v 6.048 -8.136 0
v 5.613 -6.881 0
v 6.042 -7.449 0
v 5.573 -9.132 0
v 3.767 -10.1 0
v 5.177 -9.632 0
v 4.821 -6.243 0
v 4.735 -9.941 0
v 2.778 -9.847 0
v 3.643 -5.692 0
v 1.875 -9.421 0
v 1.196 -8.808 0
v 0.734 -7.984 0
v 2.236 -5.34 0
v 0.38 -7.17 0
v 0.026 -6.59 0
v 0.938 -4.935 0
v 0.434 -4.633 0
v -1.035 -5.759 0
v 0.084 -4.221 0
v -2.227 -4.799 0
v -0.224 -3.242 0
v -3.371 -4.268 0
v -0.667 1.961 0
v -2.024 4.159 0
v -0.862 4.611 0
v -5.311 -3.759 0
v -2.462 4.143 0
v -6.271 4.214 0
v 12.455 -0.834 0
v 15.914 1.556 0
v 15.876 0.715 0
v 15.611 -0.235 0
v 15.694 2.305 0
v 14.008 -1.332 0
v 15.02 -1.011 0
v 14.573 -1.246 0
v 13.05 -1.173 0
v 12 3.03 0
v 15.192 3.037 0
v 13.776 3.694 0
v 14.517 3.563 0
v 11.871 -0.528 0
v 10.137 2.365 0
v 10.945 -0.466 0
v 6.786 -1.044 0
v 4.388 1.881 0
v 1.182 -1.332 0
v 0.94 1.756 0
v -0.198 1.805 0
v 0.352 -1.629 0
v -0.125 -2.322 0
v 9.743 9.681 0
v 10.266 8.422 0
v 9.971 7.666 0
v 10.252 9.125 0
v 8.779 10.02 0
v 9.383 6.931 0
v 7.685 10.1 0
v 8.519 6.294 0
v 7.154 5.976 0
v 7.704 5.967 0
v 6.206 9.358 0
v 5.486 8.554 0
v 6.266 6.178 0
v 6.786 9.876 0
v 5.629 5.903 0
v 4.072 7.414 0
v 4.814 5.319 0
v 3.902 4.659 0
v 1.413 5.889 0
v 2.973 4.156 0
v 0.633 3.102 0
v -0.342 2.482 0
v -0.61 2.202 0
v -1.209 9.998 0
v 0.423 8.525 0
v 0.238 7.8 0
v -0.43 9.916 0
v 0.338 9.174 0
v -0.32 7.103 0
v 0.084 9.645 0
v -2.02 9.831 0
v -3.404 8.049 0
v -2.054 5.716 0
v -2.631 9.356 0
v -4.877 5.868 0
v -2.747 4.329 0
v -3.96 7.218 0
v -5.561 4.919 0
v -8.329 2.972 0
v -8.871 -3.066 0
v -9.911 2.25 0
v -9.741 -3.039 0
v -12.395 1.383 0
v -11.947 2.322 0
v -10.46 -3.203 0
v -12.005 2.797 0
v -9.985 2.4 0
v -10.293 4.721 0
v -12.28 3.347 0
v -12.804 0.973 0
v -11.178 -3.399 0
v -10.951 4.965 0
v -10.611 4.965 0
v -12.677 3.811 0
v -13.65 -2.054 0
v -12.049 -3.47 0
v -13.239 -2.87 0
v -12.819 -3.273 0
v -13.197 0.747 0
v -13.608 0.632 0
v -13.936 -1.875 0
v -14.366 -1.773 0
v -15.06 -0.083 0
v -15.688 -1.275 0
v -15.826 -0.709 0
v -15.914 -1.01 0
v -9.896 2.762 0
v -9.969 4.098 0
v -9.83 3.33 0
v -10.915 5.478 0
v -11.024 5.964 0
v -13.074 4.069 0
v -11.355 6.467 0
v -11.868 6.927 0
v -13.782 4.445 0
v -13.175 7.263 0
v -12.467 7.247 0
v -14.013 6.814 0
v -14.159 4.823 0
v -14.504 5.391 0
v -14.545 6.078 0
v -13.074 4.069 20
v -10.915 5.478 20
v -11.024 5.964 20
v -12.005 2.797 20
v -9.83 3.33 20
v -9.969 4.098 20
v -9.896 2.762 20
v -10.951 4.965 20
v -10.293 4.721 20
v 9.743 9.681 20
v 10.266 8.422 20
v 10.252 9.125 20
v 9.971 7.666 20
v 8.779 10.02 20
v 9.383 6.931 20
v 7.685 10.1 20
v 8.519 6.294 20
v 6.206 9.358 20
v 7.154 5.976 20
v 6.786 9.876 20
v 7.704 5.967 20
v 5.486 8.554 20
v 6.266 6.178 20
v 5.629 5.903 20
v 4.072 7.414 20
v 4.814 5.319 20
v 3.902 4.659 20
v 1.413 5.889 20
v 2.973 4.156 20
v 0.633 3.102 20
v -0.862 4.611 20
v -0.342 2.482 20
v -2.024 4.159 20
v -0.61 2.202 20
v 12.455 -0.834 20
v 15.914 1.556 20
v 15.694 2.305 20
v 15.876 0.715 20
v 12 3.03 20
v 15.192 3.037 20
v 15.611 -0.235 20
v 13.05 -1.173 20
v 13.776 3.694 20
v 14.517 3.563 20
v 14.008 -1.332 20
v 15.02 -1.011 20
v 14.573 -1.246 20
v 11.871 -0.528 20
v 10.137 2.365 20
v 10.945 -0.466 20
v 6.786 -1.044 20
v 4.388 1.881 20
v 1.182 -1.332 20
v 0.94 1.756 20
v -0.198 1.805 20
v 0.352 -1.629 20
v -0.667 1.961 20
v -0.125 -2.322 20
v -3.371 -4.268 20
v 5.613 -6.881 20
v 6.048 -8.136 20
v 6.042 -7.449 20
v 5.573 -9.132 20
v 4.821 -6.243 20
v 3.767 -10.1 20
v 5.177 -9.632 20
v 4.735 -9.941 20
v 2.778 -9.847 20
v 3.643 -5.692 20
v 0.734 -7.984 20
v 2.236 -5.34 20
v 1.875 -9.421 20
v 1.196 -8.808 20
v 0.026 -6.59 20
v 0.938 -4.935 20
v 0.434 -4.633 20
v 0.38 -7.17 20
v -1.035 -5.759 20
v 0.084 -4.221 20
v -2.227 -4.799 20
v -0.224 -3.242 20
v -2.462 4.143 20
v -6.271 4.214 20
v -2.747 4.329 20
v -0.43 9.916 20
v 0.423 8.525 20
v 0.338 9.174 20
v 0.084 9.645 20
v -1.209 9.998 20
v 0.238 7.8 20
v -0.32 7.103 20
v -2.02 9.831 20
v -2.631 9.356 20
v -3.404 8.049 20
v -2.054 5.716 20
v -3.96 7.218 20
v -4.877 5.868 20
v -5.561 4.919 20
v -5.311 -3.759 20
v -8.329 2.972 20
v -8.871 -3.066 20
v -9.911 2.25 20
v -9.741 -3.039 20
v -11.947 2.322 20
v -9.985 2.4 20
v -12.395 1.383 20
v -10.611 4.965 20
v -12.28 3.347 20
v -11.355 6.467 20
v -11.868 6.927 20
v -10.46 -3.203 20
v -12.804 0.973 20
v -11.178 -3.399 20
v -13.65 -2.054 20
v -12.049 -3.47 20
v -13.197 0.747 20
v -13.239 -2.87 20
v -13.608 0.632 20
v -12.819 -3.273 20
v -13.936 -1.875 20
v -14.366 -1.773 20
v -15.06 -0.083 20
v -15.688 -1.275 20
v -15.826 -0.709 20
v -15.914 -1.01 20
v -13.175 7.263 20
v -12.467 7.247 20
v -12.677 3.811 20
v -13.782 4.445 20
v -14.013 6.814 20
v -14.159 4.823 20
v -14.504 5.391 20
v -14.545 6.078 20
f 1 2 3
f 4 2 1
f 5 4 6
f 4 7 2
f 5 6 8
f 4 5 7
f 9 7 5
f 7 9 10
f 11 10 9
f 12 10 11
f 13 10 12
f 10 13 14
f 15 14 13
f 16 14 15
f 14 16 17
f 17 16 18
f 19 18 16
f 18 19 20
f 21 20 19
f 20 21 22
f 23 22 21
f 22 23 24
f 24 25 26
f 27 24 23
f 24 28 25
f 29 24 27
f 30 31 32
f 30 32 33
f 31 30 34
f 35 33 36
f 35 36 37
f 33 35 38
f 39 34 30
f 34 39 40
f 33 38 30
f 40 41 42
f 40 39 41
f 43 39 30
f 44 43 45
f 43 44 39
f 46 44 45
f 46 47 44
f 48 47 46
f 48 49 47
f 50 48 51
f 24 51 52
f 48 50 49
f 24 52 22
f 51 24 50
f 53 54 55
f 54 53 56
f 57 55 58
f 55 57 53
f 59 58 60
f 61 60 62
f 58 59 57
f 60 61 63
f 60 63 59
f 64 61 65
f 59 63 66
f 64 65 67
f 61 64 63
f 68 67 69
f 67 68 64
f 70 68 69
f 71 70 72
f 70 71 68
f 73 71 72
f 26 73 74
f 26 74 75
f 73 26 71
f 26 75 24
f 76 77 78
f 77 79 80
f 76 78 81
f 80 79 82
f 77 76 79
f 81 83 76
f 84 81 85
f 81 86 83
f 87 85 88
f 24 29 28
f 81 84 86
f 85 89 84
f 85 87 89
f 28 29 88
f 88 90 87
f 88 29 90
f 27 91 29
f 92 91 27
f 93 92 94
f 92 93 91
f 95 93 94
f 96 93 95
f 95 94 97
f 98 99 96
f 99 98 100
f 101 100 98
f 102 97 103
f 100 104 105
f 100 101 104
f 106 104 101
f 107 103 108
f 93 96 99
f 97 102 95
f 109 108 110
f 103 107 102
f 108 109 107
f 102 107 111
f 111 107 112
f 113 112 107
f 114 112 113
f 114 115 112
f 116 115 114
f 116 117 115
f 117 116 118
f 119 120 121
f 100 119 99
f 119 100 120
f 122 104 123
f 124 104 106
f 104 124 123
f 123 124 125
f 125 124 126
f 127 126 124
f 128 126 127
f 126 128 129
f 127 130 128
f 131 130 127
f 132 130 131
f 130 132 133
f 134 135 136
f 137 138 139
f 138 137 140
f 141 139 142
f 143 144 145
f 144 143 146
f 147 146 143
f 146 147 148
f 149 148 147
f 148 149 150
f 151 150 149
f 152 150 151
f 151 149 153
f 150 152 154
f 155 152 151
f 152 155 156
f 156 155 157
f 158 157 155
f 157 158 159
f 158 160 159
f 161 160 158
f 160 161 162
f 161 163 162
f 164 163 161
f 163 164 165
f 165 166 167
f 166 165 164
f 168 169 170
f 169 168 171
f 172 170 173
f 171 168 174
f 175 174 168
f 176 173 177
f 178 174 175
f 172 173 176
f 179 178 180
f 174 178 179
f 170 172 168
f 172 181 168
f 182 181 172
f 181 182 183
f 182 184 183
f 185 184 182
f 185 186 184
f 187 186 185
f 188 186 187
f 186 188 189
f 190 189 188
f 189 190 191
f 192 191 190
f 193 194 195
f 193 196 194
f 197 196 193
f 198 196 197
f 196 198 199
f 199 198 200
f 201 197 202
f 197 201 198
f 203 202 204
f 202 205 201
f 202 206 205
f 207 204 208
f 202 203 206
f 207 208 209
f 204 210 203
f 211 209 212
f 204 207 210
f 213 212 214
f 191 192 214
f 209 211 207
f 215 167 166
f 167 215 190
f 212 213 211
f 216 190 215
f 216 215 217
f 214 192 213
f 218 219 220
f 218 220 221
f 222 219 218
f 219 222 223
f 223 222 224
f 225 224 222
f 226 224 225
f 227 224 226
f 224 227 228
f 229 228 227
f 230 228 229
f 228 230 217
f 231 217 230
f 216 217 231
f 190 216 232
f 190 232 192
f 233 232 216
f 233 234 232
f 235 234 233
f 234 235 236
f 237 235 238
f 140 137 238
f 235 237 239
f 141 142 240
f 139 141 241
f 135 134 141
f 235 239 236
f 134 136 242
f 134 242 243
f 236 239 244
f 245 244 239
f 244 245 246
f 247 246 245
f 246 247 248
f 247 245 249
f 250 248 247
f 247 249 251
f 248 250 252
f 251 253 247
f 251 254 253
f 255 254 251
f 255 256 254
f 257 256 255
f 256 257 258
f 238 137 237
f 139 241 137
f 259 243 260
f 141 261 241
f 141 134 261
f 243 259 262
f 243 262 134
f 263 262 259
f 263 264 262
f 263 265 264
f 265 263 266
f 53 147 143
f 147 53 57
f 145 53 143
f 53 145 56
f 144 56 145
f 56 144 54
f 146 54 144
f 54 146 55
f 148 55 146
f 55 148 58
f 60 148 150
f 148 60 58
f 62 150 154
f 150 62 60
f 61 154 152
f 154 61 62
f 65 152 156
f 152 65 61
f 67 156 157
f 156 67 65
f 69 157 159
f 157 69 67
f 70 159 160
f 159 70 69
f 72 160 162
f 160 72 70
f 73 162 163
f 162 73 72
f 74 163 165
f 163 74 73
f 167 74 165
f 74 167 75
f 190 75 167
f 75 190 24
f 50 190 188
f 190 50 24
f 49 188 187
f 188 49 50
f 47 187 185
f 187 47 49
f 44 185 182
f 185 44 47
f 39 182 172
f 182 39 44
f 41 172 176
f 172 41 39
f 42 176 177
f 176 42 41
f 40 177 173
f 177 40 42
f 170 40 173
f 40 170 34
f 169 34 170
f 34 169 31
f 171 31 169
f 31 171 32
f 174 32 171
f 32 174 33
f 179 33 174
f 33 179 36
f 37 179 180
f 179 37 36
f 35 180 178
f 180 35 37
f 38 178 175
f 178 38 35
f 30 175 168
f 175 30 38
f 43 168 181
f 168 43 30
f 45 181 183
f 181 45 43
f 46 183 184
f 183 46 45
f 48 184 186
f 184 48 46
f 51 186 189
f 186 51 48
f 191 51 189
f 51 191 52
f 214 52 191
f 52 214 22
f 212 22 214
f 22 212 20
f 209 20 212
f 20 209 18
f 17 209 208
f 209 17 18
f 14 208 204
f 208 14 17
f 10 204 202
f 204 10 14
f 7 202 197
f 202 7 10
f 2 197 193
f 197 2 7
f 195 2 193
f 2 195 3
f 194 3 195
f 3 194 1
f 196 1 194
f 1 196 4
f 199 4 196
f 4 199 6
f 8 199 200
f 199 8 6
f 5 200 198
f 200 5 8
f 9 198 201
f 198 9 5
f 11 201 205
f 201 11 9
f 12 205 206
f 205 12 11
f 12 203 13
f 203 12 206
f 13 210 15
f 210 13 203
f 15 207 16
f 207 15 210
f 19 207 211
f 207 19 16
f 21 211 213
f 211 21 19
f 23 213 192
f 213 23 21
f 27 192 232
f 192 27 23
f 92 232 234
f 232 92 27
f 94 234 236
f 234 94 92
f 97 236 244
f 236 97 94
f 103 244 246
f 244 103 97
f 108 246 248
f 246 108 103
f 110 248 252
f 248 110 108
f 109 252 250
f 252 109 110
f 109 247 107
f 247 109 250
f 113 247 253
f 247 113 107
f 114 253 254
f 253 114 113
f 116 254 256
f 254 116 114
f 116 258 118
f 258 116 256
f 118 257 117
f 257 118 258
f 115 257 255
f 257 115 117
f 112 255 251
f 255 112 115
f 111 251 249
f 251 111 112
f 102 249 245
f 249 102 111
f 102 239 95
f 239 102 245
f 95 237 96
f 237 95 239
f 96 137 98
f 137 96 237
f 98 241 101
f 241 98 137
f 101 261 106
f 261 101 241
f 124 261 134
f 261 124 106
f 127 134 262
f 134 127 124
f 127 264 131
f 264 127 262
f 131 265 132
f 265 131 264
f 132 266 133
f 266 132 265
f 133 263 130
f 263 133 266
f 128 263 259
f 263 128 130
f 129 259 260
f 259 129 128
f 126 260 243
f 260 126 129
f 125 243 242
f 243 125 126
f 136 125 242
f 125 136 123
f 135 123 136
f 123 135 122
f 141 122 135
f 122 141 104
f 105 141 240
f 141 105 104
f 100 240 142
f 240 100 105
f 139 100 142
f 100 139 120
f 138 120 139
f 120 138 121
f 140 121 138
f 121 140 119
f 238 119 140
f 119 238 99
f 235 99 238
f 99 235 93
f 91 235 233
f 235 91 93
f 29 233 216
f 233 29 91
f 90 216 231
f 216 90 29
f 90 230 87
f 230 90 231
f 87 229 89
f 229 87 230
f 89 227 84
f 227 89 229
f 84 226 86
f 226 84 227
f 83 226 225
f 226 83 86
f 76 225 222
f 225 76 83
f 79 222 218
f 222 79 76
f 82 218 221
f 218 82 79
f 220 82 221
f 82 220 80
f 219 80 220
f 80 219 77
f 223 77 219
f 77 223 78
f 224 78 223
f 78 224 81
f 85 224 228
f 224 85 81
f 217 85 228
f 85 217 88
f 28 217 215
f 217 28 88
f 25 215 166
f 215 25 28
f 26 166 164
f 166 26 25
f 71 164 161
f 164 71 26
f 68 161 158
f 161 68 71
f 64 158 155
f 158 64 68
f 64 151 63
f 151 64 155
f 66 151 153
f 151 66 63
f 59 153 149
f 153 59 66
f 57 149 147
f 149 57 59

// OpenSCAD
// Generated by inkscape 0.92.5 (2060ec1f9f, 2020-04-08) + inkscape-paths2openscad 0.25
// Sat Dec 25 16:41:48 2021 from "cabletoes.svg"

// Module names are of the form poly_<inkscape-path-id>().  As a result,
// you can associate a polygon in this OpenSCAD program with the corresponding
// SVG element in the Inkscape document by looking for the XML element with
// the attribute id="inkscape-path-id".

// fudge value is used to ensure that subtracted solids are a tad taller
// in the z dimension than the polygon being subtracted from.  This helps
// keep the resulting .stl file manifold.
fudge = 0.1;
zsize = 20;
line_fn = 4;
min_line_width = 1.0;
line_width_scale = 1.0;
function min_line_mm(w) = max(min_line_width, w * line_width_scale) * 96/25.4;


path8176_0_center = [-0.000000,-0.000000];
path8176_0_points = [[-51.433337,-2.388288],[-56.919584,0.313894],[-59.816240,2.678300],[-60.147616,3.818281],[-59.294229,4.817522],[-54.296878,6.699259],[-52.672889,7.087107],[-51.592286,7.762152],[-50.038896,10.848060],[-48.448927,12.370847],[-45.537671,13.115132],[-42.248654,12.845593],[-39.532827,12.105222],[-36.817000,11.487679],[-33.527983,11.586622],[-20.071666,14.206916],[-12.739614,16.131196],[-8.416808,18.137362],[-3.913173,21.767564],[0.099156,24.906462],[1.436599,27.100277],[2.774044,30.174347],[4.520910,33.289361],[7.086616,35.606002],[10.498460,37.216398],[14.237841,38.171715],[17.895338,37.571228],[19.565435,36.406082],[21.061526,34.514212],[22.859571,30.750951],[22.835690,28.154540],[21.215065,26.008492],[18.222876,23.596322],[13.767009,21.511683],[8.451354,20.184475],[3.545119,18.652558],[1.642163,17.509165],[0.317516,15.953792],[-0.845924,12.251935],[-0.474031,8.775264],[1.330838,6.158379],[4.466326,5.035882],[25.647046,3.944092],[41.368816,1.760502],[44.865960,1.995923],[47.073425,3.152541],[49.321831,4.431985],[52.941796,5.035882],[55.078466,4.710051],[56.769890,3.821266],[59.001238,0.887080],[60.004320,-2.702183],[60.147616,-5.882028],[59.315126,-8.710443],[57.418141,-11.477448],[54.866084,-13.466553],[52.068376,-13.961268],[45.353859,-11.450151],[38.311816,-8.939028],[16.585188,-7.110284],[3.551942,-6.636039],[-0.748689,-6.822411],[-2.521144,-7.410528],[-2.306196,-8.322343],[-1.292876,-9.382573],[2.391919,-11.723098],[11.235416,-15.708128],[14.746204,-17.608528],[18.195579,-20.102588],[21.276474,-22.310049],[23.681826,-23.350658],[27.039083,-22.586409],[29.116894,-22.552291],[32.197786,-23.787378],[35.462923,-26.196143],[37.684034,-28.973387],[38.799708,-31.832513],[38.748536,-34.486928],[36.824252,-36.588619],[33.180400,-37.871472],[29.045244,-38.171715],[25.647046,-37.325578],[23.456641,-35.370591],[20.733989,-32.330637],[15.391043,-28.021478],[5.339756,-22.258878],[-3.258097,-17.427706],[-7.649141,-15.718371],[-9.303458,-15.658236],[-10.382027,-16.363208],[-7.761729,-21.603798],[-1.210994,-26.844398],[0.900941,-29.481748],[1.600371,-32.221457],[1.276246,-34.674574],[0.317516,-36.452148],[-1.623824,-37.479111],[-4.568245,-37.789589],[-7.635492,-37.158399],[-9.945311,-35.360358],[-12.865850,-30.420013],[-14.967545,-27.281108],[-18.433979,-22.176989],[-21.016747,-18.591139],[-23.701870,-15.926488],[-31.480872,-11.231794],[-37.458423,-8.502318],[-37.738196,-9.072096],[-37.403835,-10.440244],[-37.151358,-12.586294],[-37.676784,-15.489778],[-38.901635,-17.843948],[-40.106015,-18.765143],[-41.388869,-18.765138],[-41.252395,-20.703070],[-41.665227,-22.542058],[-42.917373,-24.442458],[-44.855302,-26.182498],[-47.120767,-27.390290],[-49.795653,-27.451703],[-52.961847,-25.752608],[-54.974834,-22.971952],[-54.817889,-20.375536],[-53.514564,-18.229486],[-52.088415,-16.799928],[-49.413525,-15.380595],[-47.912313,-14.404805],[-46.411103,-12.651118],[-45.373903,-10.569895],[-45.155546,-8.775266],[-46.847820,-5.226948],[-48.393384,-3.677968],[-49.877536,-2.825005],[-51.433337,-2.388288],[-51.433337,-2.388288]];
module poly_path8176(h, w, s, res=line_fn)
{
  scale([25.4/96, -25.4/96, 1]) union()
  {
    translate (path8176_0_center) linear_extrude(height=h, convexity=10, scale=0.01*s)
      translate (-path8176_0_center) polygon(path8176_0_points);
  }
}

module toes(h)
{
  difference()
  {
    union()
    {
      translate ([0,0,0]) poly_path8176(h, min_line_mm(0.158813373), 100.0);
    }
    union()
    {
    }
  }
}

toes(zsize);
